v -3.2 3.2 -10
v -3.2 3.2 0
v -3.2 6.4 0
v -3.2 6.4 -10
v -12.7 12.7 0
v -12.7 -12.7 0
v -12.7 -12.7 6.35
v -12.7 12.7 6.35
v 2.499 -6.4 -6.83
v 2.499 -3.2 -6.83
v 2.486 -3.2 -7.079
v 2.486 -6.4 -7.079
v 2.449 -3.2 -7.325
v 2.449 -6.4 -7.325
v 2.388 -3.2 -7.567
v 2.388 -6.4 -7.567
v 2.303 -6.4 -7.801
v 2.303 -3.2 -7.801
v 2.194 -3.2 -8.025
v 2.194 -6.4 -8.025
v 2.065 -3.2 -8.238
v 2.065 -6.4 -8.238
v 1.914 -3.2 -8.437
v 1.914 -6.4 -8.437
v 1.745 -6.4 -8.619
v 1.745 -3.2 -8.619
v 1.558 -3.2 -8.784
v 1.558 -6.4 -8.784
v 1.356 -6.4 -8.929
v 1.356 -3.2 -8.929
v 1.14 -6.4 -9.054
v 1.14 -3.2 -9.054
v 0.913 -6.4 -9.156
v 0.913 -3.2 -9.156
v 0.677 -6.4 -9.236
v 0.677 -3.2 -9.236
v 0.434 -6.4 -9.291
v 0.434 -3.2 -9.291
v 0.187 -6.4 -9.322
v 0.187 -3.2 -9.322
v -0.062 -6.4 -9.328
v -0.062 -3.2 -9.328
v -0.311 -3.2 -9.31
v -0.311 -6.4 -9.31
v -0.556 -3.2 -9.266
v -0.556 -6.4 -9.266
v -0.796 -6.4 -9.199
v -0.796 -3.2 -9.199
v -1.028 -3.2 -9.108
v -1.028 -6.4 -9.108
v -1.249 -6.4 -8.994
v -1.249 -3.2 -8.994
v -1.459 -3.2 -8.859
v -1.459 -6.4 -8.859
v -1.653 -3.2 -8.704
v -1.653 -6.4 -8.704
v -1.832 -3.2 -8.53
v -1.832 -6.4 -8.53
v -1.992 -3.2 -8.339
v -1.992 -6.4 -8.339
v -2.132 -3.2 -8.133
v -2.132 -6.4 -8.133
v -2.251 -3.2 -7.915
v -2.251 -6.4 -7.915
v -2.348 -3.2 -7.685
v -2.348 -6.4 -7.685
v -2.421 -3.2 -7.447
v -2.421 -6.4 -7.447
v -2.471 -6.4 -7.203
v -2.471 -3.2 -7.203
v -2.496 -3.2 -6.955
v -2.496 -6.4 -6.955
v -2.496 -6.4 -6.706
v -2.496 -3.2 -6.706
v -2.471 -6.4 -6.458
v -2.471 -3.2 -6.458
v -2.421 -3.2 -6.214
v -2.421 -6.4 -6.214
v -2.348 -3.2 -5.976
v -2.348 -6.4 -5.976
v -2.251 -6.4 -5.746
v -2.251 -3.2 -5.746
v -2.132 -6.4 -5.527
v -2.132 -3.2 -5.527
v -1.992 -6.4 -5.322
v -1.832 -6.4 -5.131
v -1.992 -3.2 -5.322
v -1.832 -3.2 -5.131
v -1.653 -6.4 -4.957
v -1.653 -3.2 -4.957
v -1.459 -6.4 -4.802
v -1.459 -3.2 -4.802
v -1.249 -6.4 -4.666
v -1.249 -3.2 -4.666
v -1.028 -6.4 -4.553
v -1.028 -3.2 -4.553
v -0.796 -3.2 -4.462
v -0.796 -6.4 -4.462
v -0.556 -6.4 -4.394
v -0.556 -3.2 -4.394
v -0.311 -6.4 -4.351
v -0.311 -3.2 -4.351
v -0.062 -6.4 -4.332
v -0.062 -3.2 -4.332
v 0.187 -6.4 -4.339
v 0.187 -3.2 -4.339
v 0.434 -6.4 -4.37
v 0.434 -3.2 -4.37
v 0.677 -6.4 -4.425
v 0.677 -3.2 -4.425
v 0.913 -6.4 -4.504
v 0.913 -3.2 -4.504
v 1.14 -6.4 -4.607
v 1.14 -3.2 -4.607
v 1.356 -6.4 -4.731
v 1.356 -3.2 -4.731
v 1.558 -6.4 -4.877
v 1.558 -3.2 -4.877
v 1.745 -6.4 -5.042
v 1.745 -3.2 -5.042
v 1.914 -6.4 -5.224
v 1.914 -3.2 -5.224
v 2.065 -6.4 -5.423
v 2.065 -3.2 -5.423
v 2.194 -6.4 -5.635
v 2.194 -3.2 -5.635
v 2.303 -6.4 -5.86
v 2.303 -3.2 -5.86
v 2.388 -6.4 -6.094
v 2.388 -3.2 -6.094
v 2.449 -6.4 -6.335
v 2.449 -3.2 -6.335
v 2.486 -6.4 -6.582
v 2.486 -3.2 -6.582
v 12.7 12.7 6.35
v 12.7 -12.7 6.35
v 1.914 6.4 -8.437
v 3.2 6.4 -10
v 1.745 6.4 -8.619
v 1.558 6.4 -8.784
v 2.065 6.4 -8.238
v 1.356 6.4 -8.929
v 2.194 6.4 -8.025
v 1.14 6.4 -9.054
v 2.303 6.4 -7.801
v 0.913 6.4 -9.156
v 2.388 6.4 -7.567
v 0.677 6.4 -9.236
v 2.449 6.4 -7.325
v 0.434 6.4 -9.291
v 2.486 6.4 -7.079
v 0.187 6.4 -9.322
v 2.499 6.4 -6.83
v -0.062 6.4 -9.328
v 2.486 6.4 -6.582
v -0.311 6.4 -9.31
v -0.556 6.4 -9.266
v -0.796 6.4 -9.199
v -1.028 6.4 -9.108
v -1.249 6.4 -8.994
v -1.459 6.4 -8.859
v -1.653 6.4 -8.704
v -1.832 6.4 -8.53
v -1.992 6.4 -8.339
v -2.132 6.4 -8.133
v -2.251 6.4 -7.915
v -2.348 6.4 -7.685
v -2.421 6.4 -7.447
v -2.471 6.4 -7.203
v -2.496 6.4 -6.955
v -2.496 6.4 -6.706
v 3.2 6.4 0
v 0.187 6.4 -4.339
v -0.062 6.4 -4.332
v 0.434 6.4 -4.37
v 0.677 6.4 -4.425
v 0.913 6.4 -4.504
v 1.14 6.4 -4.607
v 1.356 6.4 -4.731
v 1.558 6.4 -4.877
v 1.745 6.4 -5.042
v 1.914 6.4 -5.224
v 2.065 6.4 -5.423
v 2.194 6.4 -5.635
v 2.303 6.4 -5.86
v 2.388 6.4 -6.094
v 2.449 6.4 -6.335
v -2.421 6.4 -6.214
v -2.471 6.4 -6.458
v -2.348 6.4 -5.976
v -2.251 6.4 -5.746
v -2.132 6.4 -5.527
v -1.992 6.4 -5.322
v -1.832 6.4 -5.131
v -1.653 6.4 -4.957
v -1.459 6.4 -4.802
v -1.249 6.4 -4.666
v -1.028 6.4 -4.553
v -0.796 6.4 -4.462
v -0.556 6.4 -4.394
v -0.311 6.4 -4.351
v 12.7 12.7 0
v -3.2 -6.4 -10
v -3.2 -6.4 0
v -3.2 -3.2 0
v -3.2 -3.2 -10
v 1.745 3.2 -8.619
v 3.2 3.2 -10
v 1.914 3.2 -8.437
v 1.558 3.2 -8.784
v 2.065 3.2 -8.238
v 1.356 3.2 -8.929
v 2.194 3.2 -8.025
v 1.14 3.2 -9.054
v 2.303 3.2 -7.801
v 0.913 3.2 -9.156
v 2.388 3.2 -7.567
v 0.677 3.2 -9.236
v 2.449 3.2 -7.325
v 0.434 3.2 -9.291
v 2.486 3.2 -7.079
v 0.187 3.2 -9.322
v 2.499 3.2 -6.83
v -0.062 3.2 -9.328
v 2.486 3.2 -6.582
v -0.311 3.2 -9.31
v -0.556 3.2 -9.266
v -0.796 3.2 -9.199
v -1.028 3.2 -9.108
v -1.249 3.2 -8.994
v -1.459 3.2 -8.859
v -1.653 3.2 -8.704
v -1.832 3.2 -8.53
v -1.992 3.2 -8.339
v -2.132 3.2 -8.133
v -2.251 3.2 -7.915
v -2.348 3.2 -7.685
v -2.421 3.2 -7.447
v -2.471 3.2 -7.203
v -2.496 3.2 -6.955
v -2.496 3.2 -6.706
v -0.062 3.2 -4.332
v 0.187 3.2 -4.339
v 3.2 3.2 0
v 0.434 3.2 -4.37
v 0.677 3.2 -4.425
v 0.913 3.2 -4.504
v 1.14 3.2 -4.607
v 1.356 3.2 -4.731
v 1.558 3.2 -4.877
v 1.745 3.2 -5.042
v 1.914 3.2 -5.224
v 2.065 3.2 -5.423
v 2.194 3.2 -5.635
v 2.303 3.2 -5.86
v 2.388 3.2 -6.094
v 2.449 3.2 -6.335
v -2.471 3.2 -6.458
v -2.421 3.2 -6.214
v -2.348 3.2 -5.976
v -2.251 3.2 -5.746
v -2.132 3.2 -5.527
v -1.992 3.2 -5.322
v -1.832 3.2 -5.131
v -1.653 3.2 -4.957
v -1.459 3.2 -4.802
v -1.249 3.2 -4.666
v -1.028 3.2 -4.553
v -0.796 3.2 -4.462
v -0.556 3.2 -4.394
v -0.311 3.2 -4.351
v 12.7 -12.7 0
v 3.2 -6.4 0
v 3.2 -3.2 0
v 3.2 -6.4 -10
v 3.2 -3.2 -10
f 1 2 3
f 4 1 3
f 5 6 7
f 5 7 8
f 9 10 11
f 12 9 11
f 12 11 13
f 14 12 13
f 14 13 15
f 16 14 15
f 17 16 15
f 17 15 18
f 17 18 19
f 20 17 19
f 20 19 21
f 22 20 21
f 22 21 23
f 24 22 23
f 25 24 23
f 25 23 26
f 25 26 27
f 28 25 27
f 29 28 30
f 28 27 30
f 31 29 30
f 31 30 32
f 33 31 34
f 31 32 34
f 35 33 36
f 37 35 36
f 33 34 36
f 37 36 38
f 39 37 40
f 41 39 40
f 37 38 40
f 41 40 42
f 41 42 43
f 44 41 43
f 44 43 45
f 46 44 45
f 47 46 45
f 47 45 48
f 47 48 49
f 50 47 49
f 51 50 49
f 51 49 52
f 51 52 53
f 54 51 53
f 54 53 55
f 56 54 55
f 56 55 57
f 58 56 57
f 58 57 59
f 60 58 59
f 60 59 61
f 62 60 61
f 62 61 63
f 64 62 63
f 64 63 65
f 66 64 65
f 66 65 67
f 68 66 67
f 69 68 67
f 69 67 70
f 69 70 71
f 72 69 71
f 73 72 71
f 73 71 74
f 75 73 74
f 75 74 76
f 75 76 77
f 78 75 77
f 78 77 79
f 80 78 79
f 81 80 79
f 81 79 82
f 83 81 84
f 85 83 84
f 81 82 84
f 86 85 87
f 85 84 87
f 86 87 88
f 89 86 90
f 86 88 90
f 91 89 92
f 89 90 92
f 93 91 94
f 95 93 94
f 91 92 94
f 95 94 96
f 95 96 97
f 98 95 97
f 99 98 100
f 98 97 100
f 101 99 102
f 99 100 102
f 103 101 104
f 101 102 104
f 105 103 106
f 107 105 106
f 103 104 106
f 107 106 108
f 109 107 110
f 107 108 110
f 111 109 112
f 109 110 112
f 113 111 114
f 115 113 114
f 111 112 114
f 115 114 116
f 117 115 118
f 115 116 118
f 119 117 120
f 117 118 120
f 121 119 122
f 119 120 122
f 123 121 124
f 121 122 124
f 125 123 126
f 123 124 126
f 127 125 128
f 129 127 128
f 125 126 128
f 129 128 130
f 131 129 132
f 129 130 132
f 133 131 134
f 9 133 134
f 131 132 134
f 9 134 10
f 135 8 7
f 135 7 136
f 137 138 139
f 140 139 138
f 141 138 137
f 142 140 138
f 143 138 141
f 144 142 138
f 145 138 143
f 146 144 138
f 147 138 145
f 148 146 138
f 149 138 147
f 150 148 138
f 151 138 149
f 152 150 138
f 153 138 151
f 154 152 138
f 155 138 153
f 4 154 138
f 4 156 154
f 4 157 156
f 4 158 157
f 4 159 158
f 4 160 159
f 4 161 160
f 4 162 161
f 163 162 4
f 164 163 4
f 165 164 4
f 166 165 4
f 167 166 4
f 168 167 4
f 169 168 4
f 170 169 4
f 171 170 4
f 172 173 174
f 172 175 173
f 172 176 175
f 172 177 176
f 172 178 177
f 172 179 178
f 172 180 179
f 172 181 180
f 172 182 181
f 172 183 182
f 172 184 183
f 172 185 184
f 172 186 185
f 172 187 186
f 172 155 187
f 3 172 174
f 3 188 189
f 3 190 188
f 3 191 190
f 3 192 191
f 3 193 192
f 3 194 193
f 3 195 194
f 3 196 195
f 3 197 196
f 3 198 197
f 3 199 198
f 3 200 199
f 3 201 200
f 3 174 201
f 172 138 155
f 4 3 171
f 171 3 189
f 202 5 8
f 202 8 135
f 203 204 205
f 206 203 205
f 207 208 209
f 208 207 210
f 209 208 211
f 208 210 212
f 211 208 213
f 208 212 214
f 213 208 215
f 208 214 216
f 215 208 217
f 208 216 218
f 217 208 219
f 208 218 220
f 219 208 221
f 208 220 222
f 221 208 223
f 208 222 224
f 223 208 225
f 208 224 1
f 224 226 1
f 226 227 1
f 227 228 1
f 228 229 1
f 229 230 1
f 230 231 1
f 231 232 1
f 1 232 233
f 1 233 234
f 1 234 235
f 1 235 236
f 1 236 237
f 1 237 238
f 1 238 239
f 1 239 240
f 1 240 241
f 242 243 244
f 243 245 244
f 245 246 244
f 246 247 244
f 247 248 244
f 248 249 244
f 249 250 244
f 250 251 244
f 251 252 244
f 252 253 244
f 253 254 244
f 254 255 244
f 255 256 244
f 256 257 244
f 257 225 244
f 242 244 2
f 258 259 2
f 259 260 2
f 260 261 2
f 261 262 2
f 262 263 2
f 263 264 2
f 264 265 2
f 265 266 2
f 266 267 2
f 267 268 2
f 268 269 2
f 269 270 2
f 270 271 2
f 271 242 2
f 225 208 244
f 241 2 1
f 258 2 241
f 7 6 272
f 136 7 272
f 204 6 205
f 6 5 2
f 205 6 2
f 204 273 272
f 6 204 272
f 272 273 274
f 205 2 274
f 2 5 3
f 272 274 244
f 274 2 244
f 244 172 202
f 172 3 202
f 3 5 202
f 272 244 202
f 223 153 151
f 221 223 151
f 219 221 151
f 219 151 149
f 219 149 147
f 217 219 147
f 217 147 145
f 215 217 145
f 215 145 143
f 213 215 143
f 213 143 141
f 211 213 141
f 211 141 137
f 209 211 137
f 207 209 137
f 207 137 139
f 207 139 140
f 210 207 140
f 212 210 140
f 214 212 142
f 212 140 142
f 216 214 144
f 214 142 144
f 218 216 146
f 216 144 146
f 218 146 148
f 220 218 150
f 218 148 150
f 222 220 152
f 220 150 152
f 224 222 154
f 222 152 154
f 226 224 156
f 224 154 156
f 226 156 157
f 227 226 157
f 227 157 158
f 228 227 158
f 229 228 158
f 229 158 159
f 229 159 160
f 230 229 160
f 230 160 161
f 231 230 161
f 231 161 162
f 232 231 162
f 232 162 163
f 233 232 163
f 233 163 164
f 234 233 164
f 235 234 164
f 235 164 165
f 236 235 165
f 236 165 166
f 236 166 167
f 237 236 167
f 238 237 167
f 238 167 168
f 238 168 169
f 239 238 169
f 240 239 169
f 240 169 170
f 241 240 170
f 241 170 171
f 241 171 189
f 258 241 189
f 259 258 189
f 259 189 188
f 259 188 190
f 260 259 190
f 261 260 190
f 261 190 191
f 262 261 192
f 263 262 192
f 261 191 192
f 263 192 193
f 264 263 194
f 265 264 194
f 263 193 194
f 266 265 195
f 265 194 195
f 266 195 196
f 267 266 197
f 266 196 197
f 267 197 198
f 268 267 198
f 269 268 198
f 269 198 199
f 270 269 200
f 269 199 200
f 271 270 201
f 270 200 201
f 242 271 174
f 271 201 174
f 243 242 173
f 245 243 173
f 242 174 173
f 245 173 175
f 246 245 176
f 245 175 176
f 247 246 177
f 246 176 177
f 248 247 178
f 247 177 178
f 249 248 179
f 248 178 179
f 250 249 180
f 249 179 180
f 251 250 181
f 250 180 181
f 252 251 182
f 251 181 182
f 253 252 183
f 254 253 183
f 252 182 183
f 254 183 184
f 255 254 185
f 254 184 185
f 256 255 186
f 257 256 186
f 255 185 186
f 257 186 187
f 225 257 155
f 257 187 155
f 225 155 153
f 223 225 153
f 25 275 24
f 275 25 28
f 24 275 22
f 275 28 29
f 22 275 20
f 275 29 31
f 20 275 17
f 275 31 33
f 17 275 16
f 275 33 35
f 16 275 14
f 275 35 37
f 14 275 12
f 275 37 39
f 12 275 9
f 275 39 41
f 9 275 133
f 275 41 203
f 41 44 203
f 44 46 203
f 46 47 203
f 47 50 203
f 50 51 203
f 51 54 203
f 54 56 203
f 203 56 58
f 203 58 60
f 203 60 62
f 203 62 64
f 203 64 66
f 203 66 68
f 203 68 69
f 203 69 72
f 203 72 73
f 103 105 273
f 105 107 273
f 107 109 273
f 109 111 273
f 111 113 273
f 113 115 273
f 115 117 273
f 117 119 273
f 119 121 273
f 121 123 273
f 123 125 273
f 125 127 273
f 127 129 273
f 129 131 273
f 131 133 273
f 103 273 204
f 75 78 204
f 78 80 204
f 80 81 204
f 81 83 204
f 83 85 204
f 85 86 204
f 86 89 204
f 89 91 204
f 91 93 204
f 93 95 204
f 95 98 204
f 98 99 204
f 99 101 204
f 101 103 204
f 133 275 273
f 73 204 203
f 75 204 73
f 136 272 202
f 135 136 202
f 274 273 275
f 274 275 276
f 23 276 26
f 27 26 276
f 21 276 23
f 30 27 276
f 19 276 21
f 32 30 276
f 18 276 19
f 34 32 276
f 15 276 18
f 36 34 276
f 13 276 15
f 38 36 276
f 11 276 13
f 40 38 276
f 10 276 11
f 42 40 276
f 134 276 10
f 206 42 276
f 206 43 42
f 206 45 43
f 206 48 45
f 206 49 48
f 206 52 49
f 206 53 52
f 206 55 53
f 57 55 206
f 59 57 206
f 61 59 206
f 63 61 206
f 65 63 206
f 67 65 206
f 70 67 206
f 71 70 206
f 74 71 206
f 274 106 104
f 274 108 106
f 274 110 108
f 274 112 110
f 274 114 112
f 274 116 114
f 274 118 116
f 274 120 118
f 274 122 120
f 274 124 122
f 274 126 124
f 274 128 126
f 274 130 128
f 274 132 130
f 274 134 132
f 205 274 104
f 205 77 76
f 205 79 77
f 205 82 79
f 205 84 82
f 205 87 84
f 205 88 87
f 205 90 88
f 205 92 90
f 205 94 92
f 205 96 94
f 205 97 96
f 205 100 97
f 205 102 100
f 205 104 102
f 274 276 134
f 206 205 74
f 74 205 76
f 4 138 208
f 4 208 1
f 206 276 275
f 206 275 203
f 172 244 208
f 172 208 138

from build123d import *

# Parameters (mm, degrees)
SKETCH1_W           = 25.4
SKETCH1_H           = 25.4
BOSS_EXTRUDE1_DEPTH = 6.35
SKETCH2_W           = 6.4
SKETCH2_H           = 3.2
BOSS_EXTRUDE2_DEPTH = 10
SKETCH3_R           = 2.498733
CUT_EXTRUDE1_DEPTH  = 20.1


with BuildPart() as part:
    # Sketch1 → Boss-Extrude1 (new body)
    with BuildSketch(Plane.XY):
        Rectangle(SKETCH1_W, SKETCH1_H)
    extrude(amount=BOSS_EXTRUDE1_DEPTH)

    # Sketch2 → Boss-Extrude2 (add)
    with BuildSketch(Plane(origin=(0, 0, 0), x_dir=(-1, 0, 0), z_dir=(0, 0, -1))):
        with Locations((0, 4.8)):
            Rectangle(SKETCH2_W, SKETCH2_H)
        with Locations((0, -4.8)):
            Rectangle(SKETCH2_W, SKETCH2_H)
    extrude(amount=BOSS_EXTRUDE2_DEPTH)

    # Sketch3 → Cut-Extrude1 (cut, through all)
    with BuildSketch(Plane(origin=(0, 6.4, 0), x_dir=(1, 0, 0), z_dir=(0, 1, 0))):
        with Locations((0, 6.830385607)):
            Circle(SKETCH3_R)
    extrude(amount=-CUT_EXTRUDE1_DEPTH, mode=Mode.SUBTRACT)


solid = part.part
